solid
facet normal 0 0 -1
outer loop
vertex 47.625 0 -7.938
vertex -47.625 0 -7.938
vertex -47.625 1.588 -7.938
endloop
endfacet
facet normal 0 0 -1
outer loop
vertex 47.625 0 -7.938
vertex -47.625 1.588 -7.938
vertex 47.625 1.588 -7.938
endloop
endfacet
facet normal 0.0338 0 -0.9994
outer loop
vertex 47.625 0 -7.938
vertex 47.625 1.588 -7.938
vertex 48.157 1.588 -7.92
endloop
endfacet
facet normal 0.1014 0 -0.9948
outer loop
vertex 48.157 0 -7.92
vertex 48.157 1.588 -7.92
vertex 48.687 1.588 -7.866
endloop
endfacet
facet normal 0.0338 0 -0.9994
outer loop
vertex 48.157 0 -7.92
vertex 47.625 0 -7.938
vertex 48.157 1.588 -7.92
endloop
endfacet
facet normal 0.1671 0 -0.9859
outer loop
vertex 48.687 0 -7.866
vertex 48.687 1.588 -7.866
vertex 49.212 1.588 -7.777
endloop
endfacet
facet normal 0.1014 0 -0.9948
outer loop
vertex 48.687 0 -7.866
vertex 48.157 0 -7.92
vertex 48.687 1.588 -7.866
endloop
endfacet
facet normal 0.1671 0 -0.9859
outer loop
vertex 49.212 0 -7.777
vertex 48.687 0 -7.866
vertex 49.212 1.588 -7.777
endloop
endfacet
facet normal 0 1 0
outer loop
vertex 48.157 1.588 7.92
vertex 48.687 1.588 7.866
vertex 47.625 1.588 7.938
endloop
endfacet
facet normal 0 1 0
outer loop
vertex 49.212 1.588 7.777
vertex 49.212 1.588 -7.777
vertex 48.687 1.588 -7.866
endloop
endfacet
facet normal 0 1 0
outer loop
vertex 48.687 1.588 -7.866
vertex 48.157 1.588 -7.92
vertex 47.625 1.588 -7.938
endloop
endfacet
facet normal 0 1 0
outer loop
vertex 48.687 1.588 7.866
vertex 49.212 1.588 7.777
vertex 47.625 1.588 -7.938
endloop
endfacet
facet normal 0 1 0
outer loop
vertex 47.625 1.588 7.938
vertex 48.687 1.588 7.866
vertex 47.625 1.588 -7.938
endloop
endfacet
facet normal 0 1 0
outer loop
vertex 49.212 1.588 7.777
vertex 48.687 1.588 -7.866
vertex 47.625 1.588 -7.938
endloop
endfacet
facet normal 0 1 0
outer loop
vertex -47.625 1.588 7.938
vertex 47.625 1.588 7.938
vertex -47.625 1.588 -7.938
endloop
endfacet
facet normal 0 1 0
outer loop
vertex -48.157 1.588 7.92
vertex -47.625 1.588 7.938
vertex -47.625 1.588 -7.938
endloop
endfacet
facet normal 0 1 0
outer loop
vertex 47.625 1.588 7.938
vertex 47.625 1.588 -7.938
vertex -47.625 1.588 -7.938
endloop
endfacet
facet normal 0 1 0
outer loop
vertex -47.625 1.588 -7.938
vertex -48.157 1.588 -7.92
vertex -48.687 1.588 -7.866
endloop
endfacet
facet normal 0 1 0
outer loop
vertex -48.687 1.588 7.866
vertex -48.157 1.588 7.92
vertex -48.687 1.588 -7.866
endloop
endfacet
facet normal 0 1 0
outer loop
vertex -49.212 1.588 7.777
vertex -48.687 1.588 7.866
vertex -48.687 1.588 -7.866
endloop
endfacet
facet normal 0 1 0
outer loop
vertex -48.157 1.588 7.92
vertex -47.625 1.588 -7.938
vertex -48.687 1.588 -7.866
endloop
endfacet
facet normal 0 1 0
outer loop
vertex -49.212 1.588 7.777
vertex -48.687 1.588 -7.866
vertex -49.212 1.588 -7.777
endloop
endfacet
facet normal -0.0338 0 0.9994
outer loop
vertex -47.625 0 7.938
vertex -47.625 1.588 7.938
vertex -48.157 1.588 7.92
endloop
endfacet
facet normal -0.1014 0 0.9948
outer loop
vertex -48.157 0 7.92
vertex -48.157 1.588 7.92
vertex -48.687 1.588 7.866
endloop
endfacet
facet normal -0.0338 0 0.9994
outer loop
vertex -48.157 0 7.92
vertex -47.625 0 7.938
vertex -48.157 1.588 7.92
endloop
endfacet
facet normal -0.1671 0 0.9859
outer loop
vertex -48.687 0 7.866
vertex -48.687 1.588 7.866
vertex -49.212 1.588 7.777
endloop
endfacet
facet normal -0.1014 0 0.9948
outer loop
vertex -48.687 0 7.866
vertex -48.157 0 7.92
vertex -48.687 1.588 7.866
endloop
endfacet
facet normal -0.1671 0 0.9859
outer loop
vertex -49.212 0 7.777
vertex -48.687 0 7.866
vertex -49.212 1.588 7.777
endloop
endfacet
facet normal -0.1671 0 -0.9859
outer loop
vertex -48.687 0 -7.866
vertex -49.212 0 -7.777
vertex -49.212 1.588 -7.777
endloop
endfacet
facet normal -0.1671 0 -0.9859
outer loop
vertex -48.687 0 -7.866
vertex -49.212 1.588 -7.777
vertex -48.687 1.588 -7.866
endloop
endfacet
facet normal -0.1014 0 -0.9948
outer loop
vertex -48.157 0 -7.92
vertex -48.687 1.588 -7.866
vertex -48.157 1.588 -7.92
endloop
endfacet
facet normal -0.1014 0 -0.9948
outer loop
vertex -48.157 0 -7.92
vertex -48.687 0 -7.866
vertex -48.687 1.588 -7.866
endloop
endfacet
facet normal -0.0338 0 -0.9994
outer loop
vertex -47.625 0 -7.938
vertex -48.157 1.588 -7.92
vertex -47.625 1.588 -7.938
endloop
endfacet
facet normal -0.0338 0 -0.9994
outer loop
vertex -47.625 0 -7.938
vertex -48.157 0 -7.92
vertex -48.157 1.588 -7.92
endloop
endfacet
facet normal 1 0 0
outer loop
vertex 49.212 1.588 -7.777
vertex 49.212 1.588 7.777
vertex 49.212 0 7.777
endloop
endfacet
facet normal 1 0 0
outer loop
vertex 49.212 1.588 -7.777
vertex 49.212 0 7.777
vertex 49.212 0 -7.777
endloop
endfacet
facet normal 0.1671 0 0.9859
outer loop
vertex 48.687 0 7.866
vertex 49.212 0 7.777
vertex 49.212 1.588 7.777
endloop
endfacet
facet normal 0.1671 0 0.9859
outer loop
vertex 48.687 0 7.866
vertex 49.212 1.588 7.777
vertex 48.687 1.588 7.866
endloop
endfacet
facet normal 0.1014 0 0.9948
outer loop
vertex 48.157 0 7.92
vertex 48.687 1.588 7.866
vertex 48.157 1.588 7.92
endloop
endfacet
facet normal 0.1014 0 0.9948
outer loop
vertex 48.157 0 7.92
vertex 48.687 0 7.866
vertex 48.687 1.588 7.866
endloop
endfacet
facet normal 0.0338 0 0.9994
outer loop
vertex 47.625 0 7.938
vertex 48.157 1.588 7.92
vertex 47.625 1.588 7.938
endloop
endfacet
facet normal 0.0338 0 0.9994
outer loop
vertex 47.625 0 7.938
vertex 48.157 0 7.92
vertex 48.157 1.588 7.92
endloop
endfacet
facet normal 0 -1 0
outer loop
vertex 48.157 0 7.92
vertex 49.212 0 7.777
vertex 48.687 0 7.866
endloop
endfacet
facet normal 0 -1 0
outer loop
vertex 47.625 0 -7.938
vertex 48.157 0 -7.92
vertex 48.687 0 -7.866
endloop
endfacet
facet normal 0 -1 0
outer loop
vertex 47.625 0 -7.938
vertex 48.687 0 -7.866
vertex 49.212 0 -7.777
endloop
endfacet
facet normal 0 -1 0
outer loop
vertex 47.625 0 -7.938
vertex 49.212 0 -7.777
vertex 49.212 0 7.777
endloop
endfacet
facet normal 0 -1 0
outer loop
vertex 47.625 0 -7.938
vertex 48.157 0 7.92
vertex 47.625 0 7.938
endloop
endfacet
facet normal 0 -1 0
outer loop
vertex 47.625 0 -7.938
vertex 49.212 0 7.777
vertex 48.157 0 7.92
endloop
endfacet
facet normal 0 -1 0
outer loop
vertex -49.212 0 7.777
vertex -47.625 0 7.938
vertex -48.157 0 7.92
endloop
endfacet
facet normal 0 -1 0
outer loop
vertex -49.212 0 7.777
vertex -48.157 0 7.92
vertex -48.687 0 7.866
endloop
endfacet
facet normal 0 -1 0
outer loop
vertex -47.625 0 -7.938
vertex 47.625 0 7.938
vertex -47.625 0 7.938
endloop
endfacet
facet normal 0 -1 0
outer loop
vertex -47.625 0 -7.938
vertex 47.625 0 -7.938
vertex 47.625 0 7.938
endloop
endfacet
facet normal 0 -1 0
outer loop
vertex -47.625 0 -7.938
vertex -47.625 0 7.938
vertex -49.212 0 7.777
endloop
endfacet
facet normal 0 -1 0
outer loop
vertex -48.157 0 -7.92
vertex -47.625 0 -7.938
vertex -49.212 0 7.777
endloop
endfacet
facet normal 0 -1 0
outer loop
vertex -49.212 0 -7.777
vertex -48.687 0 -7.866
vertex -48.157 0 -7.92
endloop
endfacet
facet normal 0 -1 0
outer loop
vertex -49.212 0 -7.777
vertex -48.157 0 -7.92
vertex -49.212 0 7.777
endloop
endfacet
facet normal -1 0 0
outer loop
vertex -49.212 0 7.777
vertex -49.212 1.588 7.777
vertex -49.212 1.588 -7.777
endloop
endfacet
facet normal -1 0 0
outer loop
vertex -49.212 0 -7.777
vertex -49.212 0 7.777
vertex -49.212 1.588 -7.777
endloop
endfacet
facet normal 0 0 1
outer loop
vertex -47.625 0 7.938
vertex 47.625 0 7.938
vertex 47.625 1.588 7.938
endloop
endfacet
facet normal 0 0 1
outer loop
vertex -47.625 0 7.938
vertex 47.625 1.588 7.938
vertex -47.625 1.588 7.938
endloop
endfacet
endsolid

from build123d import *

# Parameters (mm, degrees)
BOSS_EXTRUDE1_DEPTH = 1.5875
SKETCH2_W           = 131.81654989
SKETCH2_H           = 36.580669347
SKETCH2_W_2         = 98.425
SKETCH2_H_2         = 15.875
CUT_EXTRUDE1_DEPTH  = 2.54


with BuildPart() as part:
    # Sketch1 → Boss-Extrude1 (new body)
    with BuildSketch(Plane(origin=(0, 0, 0), x_dir=(1, 0, 0), z_dir=(0, 1, 0))):
        with BuildLine():
            Line((-47.625, 7.9375), (47.625, 7.9375))
            ThreePointArc((47.625, 7.9375), (55.5625, 0), (47.625, -7.9375))
            Line((47.625, -7.9375), (-47.625, -7.9375))
            ThreePointArc((-47.625, -7.9375), (-55.5625, 0), (-47.625, 7.9375))
        make_face()
    extrude(amount=BOSS_EXTRUDE1_DEPTH)

    # Sketch2 → Cut-Extrude1 (cut)
    with BuildSketch(Plane(origin=(0, 1.5875, 0), x_dir=(1, 0, 0), z_dir=(0, 1, 0))):
        with Locations((1.471605837, -0.35764579)):
            Rectangle(SKETCH2_W, SKETCH2_H)
        Rectangle(SKETCH2_W_2, SKETCH2_H_2, mode=Mode.SUBTRACT)
    extrude(amount=-CUT_EXTRUDE1_DEPTH, mode=Mode.SUBTRACT)


solid = part.part
